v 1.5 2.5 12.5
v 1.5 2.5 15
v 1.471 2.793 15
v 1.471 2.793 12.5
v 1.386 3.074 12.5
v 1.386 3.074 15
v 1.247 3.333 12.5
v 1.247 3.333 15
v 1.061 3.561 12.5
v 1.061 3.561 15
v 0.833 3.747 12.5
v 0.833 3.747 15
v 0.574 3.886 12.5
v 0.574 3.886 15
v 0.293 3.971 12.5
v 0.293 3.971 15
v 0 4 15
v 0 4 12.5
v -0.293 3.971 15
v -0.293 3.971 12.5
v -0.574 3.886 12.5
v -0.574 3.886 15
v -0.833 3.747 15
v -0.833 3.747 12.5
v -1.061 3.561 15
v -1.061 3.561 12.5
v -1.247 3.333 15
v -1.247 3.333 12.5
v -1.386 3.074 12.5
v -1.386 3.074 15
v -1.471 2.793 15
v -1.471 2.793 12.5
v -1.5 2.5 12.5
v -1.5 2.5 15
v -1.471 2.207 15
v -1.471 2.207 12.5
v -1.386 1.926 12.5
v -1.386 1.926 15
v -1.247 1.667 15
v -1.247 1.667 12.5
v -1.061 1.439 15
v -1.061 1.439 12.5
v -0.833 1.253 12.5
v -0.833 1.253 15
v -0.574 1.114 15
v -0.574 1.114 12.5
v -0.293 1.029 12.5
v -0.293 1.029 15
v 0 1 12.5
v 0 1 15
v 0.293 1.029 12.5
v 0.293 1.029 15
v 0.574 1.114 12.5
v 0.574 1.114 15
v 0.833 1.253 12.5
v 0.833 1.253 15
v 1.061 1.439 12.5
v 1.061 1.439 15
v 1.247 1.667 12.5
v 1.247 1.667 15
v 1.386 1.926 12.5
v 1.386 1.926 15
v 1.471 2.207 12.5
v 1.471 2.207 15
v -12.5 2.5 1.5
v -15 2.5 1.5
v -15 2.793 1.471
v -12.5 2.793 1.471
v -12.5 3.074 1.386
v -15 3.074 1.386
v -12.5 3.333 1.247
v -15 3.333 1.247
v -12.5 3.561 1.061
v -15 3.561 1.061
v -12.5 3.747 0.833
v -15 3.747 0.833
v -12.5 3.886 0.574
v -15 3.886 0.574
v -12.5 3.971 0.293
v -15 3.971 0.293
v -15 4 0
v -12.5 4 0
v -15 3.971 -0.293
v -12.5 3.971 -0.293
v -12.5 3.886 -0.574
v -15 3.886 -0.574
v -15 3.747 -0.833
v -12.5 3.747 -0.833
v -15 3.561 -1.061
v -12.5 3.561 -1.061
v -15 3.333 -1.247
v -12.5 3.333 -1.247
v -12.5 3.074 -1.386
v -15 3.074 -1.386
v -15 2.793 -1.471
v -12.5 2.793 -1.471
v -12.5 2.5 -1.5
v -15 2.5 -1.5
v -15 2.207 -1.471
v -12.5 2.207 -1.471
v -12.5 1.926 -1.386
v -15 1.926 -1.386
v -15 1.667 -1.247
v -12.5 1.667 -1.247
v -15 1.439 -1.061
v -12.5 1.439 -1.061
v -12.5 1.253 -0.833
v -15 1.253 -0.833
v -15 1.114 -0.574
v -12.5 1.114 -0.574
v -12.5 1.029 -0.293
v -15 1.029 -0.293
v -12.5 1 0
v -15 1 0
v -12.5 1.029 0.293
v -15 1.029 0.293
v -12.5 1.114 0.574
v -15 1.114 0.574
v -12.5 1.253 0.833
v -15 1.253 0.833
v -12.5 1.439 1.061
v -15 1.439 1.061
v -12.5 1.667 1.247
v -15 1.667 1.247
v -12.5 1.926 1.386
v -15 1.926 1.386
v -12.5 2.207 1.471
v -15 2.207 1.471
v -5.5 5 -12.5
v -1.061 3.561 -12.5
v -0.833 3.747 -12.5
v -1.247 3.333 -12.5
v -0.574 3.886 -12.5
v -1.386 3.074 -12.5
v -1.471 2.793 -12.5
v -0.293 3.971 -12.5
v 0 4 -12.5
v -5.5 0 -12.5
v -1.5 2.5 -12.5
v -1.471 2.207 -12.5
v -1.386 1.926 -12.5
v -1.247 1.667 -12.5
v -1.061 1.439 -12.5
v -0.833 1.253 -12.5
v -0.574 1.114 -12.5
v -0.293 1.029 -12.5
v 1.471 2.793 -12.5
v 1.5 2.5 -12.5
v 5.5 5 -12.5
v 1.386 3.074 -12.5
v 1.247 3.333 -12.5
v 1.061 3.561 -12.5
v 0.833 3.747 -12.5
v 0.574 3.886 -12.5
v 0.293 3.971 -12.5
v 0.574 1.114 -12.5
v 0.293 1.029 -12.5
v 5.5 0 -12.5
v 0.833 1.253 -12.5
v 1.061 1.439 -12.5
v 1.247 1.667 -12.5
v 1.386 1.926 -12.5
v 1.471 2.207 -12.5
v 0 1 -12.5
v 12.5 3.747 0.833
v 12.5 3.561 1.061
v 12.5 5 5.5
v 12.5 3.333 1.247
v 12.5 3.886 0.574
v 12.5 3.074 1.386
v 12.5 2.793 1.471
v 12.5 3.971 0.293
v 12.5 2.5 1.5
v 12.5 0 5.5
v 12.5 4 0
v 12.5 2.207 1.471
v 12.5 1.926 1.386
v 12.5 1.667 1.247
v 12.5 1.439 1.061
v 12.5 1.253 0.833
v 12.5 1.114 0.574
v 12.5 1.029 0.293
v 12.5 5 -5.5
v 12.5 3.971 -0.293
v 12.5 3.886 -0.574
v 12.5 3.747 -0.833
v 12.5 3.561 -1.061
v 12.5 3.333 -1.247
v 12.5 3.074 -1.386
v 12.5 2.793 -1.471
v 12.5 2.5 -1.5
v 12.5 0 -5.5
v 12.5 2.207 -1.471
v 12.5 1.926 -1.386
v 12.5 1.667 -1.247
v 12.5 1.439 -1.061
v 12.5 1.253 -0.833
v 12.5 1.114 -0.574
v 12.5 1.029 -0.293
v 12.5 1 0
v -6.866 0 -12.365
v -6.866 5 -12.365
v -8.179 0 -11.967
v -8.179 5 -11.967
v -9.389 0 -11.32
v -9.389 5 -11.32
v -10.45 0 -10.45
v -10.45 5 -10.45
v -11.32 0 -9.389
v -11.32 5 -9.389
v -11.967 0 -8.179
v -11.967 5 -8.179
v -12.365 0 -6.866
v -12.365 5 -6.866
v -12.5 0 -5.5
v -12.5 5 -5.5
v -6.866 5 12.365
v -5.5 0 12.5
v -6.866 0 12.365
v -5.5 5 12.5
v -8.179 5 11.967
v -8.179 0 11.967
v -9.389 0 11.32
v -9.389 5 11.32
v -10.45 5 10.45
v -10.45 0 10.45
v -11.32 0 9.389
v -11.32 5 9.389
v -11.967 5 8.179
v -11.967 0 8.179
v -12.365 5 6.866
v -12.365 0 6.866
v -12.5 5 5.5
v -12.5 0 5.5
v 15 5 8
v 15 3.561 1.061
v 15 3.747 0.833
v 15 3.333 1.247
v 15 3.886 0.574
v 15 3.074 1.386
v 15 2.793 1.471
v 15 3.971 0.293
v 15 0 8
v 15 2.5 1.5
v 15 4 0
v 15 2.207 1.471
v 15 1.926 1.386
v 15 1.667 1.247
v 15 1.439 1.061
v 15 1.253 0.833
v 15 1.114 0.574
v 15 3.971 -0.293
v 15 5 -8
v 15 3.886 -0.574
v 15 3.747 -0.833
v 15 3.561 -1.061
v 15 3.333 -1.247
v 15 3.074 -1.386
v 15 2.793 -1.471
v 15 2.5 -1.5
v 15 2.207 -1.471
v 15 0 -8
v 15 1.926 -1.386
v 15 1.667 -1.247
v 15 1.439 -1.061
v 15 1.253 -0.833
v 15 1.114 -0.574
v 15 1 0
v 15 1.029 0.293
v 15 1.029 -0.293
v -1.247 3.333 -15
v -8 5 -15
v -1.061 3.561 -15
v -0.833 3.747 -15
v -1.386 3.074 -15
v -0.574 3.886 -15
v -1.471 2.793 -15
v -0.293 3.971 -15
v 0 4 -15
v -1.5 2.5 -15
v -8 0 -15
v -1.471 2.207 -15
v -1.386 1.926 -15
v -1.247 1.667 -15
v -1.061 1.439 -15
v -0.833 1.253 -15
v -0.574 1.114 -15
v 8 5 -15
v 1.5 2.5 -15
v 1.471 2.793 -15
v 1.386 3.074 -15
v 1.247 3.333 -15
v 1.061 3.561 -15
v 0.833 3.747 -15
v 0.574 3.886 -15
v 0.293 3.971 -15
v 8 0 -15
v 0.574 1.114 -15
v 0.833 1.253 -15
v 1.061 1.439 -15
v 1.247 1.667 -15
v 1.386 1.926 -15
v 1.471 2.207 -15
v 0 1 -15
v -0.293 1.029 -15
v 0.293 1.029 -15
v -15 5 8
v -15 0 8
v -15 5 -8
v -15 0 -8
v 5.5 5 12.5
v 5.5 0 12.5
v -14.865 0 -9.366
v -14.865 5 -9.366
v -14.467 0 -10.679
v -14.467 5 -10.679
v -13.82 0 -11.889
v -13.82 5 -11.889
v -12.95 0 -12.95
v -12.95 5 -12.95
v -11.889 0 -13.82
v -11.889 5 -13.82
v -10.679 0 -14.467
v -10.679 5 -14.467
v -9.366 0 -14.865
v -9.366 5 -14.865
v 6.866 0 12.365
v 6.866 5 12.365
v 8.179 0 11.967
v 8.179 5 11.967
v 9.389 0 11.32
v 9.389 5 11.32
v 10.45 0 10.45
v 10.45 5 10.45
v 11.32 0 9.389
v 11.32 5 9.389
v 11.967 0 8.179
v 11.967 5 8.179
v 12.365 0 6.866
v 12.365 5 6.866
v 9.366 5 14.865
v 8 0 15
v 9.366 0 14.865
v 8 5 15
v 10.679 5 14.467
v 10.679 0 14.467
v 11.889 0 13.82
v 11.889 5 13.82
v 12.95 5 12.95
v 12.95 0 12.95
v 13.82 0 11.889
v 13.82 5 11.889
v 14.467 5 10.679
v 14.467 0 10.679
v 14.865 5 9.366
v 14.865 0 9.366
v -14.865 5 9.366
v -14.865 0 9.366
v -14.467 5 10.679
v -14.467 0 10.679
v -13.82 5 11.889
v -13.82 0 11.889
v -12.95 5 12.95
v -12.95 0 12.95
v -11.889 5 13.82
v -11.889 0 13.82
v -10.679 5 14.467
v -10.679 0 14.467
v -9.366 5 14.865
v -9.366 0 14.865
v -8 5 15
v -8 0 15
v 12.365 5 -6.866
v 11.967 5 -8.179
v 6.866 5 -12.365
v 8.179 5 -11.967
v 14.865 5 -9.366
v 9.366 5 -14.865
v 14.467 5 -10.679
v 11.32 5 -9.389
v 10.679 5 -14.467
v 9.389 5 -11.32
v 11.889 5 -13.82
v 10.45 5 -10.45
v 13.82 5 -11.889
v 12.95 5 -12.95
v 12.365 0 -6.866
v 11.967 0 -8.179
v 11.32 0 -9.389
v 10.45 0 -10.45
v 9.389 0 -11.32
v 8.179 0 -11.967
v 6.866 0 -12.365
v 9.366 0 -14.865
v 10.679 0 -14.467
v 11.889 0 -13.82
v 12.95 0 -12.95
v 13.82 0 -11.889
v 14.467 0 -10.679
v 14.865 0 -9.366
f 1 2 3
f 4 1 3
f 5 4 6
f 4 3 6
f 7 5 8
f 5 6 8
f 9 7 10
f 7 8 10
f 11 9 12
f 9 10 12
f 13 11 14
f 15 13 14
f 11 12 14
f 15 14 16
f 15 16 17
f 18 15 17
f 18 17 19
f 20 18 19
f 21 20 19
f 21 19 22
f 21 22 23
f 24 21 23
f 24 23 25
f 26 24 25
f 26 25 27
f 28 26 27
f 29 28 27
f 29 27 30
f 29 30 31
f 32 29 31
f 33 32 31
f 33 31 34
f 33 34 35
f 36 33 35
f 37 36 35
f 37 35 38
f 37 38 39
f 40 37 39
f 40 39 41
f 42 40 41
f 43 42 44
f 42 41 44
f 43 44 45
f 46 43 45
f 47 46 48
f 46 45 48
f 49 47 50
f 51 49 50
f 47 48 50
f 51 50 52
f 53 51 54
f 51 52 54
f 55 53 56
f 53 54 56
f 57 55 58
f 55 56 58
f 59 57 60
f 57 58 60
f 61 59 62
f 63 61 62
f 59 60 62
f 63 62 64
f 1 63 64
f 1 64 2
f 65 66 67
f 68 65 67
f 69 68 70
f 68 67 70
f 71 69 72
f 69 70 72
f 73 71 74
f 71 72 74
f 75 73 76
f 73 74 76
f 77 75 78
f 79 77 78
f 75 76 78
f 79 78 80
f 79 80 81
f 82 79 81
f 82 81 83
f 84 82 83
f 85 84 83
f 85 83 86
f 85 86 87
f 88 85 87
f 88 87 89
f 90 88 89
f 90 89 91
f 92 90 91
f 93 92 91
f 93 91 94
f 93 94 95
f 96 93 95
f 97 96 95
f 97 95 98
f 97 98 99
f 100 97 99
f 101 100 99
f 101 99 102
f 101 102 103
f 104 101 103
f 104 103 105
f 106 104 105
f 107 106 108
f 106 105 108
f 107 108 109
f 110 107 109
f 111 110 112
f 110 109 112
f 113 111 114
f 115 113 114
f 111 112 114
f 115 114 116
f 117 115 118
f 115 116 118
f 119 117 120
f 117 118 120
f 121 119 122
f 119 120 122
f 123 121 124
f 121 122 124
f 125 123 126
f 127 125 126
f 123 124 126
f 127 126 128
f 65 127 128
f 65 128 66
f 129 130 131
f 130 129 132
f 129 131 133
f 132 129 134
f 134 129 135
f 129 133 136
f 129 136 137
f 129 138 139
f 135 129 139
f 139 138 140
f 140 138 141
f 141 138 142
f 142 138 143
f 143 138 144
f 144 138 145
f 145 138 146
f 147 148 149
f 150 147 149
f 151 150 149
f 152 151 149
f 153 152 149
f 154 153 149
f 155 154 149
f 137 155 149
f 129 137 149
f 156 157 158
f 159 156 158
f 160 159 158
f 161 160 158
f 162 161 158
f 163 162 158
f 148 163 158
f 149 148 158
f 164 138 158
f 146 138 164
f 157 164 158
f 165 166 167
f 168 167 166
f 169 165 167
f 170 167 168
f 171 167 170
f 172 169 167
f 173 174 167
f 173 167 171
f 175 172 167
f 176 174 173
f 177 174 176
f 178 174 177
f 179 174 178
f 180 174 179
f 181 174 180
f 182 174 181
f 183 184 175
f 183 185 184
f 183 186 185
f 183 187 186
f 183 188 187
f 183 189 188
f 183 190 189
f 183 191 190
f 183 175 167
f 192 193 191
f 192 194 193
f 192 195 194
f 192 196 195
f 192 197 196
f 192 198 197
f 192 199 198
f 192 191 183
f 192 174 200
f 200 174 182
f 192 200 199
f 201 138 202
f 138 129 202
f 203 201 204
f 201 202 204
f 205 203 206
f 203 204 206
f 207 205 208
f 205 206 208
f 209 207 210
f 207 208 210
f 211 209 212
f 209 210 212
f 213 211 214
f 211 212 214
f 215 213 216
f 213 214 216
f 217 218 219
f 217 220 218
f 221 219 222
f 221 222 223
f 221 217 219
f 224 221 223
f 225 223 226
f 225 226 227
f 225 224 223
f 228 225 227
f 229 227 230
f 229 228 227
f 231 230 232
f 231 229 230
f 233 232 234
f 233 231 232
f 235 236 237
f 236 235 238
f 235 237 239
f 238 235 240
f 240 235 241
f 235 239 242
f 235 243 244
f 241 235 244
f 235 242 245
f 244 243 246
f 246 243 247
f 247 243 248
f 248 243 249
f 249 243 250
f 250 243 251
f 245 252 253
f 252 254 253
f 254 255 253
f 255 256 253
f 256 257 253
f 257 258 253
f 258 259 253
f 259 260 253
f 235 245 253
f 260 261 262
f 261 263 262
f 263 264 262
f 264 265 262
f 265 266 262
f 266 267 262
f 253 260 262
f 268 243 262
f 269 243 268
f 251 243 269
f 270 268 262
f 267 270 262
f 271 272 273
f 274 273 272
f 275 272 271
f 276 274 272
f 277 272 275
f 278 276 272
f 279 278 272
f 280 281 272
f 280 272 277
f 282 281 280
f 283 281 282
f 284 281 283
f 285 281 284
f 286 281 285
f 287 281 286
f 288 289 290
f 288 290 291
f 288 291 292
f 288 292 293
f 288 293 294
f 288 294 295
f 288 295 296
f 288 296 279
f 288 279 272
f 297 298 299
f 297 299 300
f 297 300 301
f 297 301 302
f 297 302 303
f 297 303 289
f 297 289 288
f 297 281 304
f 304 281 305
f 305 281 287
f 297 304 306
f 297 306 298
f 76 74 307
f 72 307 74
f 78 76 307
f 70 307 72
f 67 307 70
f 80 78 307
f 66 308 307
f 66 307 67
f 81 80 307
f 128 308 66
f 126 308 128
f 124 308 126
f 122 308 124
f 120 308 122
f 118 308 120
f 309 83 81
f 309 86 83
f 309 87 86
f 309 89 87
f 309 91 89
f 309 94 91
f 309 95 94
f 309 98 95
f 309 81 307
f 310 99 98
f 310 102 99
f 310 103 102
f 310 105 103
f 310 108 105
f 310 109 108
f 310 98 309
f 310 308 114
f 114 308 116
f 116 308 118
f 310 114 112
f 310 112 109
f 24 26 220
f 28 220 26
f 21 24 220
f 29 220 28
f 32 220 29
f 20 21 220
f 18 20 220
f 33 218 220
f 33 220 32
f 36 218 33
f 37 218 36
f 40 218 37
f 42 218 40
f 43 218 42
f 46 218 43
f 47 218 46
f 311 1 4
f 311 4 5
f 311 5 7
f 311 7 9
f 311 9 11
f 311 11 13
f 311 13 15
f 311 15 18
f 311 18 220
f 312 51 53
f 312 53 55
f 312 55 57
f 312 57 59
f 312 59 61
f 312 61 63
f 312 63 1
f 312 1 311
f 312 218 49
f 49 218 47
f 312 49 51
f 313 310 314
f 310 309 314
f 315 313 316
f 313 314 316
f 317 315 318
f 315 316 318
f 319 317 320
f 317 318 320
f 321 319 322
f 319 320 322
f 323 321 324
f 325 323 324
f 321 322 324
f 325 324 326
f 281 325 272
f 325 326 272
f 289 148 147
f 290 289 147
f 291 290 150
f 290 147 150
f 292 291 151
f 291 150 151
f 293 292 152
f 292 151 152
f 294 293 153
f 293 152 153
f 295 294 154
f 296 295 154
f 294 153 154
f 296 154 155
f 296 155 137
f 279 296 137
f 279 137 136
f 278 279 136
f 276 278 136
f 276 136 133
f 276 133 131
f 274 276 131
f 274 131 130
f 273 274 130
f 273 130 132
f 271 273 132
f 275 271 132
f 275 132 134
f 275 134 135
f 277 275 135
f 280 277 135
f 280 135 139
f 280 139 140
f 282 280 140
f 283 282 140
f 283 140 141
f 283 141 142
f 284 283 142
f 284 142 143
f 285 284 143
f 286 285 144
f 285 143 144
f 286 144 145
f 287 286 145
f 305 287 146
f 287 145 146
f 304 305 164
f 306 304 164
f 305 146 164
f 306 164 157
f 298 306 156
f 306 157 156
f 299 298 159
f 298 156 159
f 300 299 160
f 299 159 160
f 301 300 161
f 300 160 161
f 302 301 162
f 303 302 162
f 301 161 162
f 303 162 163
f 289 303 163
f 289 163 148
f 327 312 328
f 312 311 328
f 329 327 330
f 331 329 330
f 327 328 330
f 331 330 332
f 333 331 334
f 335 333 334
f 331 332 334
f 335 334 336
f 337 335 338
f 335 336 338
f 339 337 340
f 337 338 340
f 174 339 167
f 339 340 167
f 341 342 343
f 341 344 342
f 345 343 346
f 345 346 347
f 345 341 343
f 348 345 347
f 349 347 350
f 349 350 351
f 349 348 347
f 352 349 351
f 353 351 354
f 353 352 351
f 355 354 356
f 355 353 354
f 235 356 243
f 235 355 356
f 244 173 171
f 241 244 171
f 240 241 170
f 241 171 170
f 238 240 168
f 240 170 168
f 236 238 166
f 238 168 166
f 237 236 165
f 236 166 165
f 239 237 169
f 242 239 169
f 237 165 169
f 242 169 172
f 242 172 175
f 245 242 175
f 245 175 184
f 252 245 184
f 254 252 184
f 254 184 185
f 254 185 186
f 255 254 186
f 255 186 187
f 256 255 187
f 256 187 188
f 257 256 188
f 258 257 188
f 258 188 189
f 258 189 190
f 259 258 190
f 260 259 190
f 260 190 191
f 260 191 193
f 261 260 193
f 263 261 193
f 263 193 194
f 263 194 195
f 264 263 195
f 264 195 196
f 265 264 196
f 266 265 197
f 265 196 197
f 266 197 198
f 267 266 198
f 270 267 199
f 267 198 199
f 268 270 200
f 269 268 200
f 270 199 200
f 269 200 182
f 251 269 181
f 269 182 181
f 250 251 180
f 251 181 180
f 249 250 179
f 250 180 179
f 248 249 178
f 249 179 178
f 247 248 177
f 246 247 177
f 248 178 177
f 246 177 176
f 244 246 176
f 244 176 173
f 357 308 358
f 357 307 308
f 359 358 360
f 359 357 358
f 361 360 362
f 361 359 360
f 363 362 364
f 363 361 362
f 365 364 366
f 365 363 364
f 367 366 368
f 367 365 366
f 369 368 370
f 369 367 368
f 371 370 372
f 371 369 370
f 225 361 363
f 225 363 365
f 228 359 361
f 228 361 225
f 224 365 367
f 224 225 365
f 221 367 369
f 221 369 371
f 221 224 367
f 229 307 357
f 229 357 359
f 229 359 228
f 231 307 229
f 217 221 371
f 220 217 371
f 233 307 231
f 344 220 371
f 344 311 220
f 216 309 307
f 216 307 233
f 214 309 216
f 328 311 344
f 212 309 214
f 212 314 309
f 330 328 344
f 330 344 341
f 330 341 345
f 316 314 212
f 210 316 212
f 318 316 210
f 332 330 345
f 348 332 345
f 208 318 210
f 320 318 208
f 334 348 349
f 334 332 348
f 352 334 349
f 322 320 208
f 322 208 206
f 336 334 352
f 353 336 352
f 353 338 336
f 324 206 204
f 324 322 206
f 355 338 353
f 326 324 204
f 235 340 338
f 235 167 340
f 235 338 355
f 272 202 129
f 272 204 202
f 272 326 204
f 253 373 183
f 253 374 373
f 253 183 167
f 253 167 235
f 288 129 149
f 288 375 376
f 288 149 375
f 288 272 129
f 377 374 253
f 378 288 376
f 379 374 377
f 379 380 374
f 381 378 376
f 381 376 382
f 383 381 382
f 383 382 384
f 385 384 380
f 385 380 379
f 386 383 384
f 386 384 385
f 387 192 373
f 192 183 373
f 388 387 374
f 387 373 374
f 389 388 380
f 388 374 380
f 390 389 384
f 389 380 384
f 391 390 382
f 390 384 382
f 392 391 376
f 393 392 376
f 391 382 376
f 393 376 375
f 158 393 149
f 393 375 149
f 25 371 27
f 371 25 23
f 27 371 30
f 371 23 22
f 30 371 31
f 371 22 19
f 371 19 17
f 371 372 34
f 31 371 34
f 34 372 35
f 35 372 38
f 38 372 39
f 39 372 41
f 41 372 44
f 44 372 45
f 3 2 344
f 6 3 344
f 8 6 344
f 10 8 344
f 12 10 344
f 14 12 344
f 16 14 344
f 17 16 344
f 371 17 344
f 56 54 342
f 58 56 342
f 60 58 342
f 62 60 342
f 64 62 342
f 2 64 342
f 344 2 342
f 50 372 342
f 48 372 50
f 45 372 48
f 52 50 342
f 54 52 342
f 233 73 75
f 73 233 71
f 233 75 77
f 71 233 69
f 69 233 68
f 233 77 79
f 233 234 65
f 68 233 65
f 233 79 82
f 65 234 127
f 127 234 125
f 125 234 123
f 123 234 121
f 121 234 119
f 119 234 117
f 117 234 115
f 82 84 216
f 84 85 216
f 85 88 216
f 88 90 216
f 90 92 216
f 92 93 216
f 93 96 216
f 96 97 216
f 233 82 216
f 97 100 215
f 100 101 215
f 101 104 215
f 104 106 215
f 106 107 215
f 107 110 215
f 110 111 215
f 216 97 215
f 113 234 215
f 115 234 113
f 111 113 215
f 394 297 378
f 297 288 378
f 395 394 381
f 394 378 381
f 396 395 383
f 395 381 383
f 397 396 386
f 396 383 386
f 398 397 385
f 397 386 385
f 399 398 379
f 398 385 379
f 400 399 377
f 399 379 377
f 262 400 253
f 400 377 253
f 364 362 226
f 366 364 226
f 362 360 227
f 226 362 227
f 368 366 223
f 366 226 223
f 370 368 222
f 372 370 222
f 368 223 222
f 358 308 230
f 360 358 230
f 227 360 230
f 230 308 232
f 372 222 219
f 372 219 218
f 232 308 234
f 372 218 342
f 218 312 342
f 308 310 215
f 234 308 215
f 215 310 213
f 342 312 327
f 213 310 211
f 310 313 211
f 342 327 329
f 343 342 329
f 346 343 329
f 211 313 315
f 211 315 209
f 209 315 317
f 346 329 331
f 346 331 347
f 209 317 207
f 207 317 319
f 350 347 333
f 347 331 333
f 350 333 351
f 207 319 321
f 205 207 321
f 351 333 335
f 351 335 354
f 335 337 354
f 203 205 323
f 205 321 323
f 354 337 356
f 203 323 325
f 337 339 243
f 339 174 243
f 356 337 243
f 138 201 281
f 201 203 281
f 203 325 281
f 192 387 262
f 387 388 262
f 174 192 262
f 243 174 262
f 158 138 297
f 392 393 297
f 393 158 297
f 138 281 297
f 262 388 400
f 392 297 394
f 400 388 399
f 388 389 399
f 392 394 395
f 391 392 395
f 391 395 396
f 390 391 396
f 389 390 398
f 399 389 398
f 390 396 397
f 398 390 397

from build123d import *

# Parameters (mm, degrees)
CROQUIS1_W                 = 30
CROQUIS1_H                 = 30
CROQUIS1_W_2               = 25
CROQUIS1_H_2               = 25
SALIENTE_EXTRUIR1_DEPTH    = 5
CROQUIS2_R                 = 1.5
CORTAR_EXTRUIR1_DEPTH      = 1
CORTAR_EXTRUIR1_DEPTH_BACK = 31
CROQUIS3_R                 = 1.5
CORTAR_EXTRUIR2_DEPTH      = 1
CORTAR_EXTRUIR2_DEPTH_BACK = 31
REDONDEO1_R                = 7


with BuildPart() as part:
    # Croquis1 → Saliente-Extruir1 (new body)
    with BuildSketch(Plane(origin=(0, 0, 0), x_dir=(1, 0, 0), z_dir=(0, 1, 0))):
        Rectangle(CROQUIS1_W, CROQUIS1_H)
        Rectangle(CROQUIS1_W_2, CROQUIS1_H_2, mode=Mode.SUBTRACT)
    extrude(amount=SALIENTE_EXTRUIR1_DEPTH)

    # Croquis2 → Cortar-Extruir1 (cut, two sides)
    with BuildSketch(Plane.XY.offset(15)) as cortar_extruir1_sk:
        with Locations((0, 2.5)):
            Circle(CROQUIS2_R)
    extrude(amount=CORTAR_EXTRUIR1_DEPTH, mode=Mode.SUBTRACT)
    extrude(cortar_extruir1_sk.sketch, amount=-CORTAR_EXTRUIR1_DEPTH_BACK, mode=Mode.SUBTRACT)

    # Croquis3 → Cortar-Extruir2 (cut, two sides)
    with BuildSketch(Plane.ZY.offset(15)) as cortar_extruir2_sk:
        with Locations((0, 2.5)):
            Circle(CROQUIS3_R)
    extrude(amount=CORTAR_EXTRUIR2_DEPTH, mode=Mode.SUBTRACT)
    extrude(cortar_extruir2_sk.sketch, amount=-CORTAR_EXTRUIR2_DEPTH_BACK, mode=Mode.SUBTRACT)

    # Redondeo1
    redondeo1_edges = [part.edges().sort_by_distance(p)[0] for p in [
        (-12.5, 2.5, -12.5),
        (-12.5, 2.5, 12.5),
        (12.5, 2.5, 12.5),
        (12.5, 2.5, -12.5),
        (15, 2.5, 15),
        (-15, 2.5, 15),
        (-15, 2.5, -15),
        (15, 2.5, -15),
    ]]
    fillet(redondeo1_edges, radius=REDONDEO1_R)


solid = part.part
